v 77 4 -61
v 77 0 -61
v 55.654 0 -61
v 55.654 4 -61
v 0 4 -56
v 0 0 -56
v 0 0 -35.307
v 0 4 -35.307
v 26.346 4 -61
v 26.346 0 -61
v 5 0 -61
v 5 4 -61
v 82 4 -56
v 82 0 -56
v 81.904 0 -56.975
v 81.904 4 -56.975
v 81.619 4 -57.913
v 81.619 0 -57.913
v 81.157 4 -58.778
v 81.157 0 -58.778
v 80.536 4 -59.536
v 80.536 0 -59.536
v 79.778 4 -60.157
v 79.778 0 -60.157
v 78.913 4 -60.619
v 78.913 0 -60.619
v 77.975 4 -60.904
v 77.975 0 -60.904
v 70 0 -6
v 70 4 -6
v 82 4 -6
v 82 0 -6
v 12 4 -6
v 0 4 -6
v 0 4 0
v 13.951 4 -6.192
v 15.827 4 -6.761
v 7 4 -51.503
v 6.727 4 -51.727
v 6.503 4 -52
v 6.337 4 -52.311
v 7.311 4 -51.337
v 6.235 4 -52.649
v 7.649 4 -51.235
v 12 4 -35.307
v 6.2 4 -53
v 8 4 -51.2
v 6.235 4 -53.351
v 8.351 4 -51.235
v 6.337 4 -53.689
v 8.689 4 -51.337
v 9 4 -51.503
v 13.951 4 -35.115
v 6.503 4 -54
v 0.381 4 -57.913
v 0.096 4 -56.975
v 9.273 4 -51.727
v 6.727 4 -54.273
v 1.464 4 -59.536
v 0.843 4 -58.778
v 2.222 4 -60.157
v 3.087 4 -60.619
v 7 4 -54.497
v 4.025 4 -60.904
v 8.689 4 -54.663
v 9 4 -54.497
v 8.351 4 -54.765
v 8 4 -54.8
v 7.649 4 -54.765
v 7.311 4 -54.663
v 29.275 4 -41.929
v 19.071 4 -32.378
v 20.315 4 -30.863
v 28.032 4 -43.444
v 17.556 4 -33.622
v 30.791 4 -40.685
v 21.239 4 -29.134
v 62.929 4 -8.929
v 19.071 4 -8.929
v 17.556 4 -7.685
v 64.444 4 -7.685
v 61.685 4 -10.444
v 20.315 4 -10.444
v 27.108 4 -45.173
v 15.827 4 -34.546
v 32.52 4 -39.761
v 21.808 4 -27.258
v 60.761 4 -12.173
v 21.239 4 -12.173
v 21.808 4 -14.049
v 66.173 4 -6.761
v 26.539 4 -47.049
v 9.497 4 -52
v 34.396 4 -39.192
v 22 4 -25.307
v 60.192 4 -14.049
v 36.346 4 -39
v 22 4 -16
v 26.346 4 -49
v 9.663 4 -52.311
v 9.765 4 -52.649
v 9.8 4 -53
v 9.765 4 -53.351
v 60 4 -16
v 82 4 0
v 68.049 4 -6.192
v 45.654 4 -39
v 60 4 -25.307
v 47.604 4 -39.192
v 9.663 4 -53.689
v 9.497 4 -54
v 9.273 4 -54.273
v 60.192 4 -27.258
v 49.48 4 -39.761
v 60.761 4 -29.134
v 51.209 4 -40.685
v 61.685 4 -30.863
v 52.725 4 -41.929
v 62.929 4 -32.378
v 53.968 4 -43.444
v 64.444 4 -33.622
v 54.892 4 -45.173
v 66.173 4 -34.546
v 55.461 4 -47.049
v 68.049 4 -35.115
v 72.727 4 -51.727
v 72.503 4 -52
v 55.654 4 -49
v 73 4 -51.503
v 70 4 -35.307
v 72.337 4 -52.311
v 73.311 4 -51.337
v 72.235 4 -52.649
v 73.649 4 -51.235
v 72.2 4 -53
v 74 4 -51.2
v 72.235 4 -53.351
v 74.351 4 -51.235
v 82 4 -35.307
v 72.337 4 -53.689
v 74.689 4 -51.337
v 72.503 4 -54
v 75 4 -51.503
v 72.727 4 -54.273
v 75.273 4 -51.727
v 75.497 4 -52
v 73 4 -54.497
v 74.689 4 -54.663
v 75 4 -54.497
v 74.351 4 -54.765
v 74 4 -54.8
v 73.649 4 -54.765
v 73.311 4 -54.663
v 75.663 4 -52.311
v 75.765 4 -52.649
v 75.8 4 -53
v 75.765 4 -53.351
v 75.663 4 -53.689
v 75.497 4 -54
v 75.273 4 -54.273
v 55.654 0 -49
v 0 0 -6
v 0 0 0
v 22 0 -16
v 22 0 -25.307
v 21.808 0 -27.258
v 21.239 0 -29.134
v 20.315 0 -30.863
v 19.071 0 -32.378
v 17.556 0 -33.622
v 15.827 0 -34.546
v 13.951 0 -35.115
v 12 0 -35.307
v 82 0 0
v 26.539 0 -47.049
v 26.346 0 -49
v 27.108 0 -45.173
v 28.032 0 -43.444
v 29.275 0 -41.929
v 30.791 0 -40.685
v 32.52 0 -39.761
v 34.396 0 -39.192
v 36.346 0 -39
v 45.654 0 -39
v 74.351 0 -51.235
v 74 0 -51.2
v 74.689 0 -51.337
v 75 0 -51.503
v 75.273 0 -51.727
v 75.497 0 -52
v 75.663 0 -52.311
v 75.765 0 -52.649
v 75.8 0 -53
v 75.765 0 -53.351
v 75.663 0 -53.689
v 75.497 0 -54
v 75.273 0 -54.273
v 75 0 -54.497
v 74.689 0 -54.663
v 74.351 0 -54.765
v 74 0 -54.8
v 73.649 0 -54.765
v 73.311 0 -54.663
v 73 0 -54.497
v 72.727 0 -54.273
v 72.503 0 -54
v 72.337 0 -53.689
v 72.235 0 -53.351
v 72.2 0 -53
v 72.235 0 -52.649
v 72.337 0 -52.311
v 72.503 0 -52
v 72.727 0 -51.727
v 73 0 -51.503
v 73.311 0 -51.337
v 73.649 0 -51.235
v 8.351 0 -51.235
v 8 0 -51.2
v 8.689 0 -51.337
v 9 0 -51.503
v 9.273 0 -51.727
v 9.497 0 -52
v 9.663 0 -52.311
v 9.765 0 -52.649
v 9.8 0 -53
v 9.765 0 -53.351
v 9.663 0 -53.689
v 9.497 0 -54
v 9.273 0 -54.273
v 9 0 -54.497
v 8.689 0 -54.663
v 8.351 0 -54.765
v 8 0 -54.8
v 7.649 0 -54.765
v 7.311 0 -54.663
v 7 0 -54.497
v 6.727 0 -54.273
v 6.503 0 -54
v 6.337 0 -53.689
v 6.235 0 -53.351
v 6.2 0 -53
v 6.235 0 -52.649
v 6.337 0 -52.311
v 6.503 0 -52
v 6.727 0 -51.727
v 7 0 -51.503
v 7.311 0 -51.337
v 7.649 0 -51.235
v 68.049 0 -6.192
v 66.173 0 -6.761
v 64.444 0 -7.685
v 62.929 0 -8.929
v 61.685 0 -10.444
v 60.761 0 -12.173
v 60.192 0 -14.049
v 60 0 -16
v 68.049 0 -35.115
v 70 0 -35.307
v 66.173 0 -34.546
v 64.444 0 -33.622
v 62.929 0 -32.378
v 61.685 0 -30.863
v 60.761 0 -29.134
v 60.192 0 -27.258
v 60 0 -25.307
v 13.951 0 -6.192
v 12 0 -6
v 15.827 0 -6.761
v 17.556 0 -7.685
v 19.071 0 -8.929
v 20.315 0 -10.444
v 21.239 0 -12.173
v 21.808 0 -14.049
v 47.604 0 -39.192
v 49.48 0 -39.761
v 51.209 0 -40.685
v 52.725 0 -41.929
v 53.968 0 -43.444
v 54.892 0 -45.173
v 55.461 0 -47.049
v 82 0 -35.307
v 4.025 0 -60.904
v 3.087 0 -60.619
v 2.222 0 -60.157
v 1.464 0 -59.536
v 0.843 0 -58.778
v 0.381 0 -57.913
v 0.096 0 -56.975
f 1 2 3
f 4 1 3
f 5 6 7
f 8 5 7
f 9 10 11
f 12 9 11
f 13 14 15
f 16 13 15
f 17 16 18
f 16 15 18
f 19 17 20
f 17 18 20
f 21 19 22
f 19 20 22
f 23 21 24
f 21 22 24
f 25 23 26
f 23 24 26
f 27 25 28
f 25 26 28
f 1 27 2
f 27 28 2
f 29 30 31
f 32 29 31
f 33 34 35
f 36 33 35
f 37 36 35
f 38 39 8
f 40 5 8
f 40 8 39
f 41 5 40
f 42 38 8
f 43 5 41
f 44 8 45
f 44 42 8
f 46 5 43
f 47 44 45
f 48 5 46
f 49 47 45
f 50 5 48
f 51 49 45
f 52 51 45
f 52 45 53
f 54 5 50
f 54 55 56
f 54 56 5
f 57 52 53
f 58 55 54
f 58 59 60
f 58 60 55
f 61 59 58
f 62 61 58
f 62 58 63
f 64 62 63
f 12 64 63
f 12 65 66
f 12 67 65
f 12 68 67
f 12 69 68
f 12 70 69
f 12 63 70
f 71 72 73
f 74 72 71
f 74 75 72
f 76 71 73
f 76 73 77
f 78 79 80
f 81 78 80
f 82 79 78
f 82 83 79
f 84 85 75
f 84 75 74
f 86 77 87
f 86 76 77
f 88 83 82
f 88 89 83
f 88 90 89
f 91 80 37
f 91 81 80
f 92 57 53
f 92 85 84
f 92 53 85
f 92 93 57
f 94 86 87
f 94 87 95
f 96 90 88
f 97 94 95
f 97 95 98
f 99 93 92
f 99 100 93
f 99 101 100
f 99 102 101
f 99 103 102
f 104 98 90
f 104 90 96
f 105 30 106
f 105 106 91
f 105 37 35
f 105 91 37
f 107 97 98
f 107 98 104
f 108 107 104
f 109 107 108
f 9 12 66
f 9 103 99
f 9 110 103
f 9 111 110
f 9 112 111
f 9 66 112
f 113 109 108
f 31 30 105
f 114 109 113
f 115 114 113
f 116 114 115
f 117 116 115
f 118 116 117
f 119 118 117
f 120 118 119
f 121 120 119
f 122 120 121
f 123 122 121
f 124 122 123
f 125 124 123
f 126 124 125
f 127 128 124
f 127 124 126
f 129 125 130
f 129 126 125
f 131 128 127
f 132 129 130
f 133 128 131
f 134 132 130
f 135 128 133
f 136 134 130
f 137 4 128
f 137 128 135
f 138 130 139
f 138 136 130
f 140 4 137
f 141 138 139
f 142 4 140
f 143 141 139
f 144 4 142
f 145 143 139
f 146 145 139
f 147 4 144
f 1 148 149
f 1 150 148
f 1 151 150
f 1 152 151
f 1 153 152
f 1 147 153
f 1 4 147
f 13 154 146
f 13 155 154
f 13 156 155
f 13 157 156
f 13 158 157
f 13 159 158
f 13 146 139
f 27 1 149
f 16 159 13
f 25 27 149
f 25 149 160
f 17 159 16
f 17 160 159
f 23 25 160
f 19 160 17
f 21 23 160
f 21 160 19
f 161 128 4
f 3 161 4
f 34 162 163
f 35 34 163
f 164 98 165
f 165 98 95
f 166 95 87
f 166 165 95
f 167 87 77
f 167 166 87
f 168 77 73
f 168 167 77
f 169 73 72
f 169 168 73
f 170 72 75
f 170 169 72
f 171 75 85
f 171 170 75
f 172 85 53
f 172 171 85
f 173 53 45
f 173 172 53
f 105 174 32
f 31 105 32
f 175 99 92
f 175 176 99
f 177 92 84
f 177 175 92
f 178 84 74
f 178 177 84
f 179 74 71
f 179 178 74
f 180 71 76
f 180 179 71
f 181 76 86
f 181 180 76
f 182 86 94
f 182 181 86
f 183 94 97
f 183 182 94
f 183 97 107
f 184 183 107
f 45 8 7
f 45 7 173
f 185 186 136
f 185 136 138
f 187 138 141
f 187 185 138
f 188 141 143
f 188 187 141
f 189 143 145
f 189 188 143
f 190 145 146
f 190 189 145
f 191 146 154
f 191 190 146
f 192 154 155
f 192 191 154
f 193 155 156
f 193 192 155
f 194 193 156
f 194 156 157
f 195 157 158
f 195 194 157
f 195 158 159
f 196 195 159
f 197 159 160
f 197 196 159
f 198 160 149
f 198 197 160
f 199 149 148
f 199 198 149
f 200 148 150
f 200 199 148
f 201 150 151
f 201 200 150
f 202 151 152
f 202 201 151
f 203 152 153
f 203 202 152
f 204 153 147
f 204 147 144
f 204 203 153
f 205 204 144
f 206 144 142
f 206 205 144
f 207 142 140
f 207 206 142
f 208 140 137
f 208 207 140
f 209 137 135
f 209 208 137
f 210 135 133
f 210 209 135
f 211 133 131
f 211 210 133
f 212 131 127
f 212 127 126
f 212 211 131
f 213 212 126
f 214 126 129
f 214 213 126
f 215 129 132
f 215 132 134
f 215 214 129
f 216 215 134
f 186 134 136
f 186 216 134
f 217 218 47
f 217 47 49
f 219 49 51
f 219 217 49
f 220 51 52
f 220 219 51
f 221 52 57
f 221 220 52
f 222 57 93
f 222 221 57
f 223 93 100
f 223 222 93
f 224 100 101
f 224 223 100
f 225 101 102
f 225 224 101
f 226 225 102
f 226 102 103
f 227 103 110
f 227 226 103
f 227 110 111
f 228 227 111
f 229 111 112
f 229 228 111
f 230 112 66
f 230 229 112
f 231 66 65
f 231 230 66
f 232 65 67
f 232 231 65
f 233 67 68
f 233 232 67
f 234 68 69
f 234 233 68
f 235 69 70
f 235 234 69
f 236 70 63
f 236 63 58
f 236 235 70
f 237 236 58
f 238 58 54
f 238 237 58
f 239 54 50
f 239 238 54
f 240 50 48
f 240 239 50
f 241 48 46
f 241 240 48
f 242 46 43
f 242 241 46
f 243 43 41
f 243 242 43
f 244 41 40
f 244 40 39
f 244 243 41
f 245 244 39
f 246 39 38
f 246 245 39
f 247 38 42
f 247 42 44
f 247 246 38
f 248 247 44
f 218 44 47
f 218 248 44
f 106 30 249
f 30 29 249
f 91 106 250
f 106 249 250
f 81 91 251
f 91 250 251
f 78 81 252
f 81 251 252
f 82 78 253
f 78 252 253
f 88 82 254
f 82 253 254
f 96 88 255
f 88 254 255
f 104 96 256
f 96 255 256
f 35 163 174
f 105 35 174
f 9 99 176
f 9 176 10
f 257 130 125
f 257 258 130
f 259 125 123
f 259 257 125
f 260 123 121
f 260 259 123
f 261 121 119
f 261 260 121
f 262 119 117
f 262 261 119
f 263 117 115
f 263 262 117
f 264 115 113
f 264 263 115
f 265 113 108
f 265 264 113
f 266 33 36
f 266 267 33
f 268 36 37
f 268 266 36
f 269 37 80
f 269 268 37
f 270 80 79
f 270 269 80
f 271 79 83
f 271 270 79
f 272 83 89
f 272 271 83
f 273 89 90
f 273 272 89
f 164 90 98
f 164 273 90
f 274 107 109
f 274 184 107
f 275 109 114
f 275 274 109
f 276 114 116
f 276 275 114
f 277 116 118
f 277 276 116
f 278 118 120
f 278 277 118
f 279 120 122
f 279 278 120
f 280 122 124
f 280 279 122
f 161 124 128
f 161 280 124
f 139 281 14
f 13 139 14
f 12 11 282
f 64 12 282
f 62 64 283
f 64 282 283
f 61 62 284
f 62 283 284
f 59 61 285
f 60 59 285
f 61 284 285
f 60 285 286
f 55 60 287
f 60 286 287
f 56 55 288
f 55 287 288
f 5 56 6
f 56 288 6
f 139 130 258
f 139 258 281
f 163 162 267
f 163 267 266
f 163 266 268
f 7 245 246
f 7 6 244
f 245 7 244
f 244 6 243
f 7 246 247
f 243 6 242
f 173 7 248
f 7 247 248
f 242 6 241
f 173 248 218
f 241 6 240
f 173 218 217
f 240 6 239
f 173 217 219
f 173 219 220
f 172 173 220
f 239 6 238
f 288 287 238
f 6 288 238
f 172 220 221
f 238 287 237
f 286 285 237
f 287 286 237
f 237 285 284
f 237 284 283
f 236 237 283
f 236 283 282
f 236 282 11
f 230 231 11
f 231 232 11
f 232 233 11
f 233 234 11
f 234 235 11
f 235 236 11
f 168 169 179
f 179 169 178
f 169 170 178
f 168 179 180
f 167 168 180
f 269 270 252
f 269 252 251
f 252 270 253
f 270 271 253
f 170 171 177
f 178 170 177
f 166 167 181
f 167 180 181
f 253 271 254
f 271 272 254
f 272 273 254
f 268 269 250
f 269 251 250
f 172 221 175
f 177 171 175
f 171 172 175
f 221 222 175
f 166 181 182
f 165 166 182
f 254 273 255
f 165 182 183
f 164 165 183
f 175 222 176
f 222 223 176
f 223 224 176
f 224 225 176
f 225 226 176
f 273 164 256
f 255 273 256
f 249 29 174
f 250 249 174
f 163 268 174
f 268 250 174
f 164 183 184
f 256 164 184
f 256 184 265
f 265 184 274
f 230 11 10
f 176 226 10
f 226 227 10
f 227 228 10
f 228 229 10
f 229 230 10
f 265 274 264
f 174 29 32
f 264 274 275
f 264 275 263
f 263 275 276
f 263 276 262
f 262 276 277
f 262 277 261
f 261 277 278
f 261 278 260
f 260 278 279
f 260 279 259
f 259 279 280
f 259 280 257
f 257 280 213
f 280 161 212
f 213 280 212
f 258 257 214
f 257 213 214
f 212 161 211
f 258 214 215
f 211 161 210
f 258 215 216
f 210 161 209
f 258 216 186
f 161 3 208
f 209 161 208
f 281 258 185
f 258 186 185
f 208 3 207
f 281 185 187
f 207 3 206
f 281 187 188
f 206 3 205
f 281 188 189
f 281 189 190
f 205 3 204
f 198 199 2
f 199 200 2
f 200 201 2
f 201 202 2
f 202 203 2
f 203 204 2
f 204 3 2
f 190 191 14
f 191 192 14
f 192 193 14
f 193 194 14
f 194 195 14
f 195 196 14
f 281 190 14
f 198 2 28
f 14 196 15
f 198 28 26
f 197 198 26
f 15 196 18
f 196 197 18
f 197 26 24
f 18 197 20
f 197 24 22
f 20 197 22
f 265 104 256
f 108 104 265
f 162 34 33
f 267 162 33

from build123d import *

# Parameters (mm, degrees)
SKETCH1_R           = 1.8
BOSS_EXTRUDE1_DEPTH = 4
SKETCH2_W           = 29.307012988
SKETCH2_H           = 22
SKETCH2_W_2         = 22
SKETCH2_H_2         = 29.307012987
CUT_EXTRUDE1_DEPTH  = 103.279030109
FILLET1_R           = 10


with BuildPart() as part:
    # Sketch1 → Boss-Extrude1 (new body)
    with BuildSketch(Plane(origin=(0, 0, 0), x_dir=(1, 0, 0), z_dir=(0, 1, 0))):
        with BuildLine():
            Line((0, 0), (82, 0))
            Line((82, 0), (82, 56))
            ThreePointArc((82, 56), (80.535533906, 59.535533906), (77, 61))
            Line((77, 61), (5, 61))
            ThreePointArc((5, 61), (1.464466094, 59.535533906), (0, 56))
            Line((0, 56), (0, 0))
        make_face()
        with Locations(Location((8, 53, 0), (0, 0, 270))):
            Circle(SKETCH1_R, mode=Mode.SUBTRACT)
        with Locations(Location((74, 53, 0), (0, 0, 270))):
            Circle(SKETCH1_R, mode=Mode.SUBTRACT)
    extrude(amount=BOSS_EXTRUDE1_DEPTH)

    # Sketch2 → Cut-Extrude1 (cut, through all)
    with BuildSketch(Plane(origin=(0, 4, 0), x_dir=(1, 0, 0), z_dir=(0, 1, 0))):
        with Locations((41, 50)):
            Rectangle(SKETCH2_W, SKETCH2_H)
        with Locations((71, 20.653506494)):
            Rectangle(SKETCH2_W_2, SKETCH2_H_2)
        with Locations((11, 20.653506494)):
            Rectangle(SKETCH2_W_2, SKETCH2_H_2)
    extrude(amount=-CUT_EXTRUDE1_DEPTH, mode=Mode.SUBTRACT)

    # Fillet1
    fillet1_edges = [part.edges().sort_by_distance(p)[0] for p in [
        (26.346493506, 2, -39),
        (55.653506494, 2, -39),
        (60, 2, -6),
        (60, 2, -35.307012987),
        (22, 2, -35.307012987),
        (22, 2, -6),
    ]]
    fillet(fillet1_edges, radius=FILLET1_R)


solid = part.part
